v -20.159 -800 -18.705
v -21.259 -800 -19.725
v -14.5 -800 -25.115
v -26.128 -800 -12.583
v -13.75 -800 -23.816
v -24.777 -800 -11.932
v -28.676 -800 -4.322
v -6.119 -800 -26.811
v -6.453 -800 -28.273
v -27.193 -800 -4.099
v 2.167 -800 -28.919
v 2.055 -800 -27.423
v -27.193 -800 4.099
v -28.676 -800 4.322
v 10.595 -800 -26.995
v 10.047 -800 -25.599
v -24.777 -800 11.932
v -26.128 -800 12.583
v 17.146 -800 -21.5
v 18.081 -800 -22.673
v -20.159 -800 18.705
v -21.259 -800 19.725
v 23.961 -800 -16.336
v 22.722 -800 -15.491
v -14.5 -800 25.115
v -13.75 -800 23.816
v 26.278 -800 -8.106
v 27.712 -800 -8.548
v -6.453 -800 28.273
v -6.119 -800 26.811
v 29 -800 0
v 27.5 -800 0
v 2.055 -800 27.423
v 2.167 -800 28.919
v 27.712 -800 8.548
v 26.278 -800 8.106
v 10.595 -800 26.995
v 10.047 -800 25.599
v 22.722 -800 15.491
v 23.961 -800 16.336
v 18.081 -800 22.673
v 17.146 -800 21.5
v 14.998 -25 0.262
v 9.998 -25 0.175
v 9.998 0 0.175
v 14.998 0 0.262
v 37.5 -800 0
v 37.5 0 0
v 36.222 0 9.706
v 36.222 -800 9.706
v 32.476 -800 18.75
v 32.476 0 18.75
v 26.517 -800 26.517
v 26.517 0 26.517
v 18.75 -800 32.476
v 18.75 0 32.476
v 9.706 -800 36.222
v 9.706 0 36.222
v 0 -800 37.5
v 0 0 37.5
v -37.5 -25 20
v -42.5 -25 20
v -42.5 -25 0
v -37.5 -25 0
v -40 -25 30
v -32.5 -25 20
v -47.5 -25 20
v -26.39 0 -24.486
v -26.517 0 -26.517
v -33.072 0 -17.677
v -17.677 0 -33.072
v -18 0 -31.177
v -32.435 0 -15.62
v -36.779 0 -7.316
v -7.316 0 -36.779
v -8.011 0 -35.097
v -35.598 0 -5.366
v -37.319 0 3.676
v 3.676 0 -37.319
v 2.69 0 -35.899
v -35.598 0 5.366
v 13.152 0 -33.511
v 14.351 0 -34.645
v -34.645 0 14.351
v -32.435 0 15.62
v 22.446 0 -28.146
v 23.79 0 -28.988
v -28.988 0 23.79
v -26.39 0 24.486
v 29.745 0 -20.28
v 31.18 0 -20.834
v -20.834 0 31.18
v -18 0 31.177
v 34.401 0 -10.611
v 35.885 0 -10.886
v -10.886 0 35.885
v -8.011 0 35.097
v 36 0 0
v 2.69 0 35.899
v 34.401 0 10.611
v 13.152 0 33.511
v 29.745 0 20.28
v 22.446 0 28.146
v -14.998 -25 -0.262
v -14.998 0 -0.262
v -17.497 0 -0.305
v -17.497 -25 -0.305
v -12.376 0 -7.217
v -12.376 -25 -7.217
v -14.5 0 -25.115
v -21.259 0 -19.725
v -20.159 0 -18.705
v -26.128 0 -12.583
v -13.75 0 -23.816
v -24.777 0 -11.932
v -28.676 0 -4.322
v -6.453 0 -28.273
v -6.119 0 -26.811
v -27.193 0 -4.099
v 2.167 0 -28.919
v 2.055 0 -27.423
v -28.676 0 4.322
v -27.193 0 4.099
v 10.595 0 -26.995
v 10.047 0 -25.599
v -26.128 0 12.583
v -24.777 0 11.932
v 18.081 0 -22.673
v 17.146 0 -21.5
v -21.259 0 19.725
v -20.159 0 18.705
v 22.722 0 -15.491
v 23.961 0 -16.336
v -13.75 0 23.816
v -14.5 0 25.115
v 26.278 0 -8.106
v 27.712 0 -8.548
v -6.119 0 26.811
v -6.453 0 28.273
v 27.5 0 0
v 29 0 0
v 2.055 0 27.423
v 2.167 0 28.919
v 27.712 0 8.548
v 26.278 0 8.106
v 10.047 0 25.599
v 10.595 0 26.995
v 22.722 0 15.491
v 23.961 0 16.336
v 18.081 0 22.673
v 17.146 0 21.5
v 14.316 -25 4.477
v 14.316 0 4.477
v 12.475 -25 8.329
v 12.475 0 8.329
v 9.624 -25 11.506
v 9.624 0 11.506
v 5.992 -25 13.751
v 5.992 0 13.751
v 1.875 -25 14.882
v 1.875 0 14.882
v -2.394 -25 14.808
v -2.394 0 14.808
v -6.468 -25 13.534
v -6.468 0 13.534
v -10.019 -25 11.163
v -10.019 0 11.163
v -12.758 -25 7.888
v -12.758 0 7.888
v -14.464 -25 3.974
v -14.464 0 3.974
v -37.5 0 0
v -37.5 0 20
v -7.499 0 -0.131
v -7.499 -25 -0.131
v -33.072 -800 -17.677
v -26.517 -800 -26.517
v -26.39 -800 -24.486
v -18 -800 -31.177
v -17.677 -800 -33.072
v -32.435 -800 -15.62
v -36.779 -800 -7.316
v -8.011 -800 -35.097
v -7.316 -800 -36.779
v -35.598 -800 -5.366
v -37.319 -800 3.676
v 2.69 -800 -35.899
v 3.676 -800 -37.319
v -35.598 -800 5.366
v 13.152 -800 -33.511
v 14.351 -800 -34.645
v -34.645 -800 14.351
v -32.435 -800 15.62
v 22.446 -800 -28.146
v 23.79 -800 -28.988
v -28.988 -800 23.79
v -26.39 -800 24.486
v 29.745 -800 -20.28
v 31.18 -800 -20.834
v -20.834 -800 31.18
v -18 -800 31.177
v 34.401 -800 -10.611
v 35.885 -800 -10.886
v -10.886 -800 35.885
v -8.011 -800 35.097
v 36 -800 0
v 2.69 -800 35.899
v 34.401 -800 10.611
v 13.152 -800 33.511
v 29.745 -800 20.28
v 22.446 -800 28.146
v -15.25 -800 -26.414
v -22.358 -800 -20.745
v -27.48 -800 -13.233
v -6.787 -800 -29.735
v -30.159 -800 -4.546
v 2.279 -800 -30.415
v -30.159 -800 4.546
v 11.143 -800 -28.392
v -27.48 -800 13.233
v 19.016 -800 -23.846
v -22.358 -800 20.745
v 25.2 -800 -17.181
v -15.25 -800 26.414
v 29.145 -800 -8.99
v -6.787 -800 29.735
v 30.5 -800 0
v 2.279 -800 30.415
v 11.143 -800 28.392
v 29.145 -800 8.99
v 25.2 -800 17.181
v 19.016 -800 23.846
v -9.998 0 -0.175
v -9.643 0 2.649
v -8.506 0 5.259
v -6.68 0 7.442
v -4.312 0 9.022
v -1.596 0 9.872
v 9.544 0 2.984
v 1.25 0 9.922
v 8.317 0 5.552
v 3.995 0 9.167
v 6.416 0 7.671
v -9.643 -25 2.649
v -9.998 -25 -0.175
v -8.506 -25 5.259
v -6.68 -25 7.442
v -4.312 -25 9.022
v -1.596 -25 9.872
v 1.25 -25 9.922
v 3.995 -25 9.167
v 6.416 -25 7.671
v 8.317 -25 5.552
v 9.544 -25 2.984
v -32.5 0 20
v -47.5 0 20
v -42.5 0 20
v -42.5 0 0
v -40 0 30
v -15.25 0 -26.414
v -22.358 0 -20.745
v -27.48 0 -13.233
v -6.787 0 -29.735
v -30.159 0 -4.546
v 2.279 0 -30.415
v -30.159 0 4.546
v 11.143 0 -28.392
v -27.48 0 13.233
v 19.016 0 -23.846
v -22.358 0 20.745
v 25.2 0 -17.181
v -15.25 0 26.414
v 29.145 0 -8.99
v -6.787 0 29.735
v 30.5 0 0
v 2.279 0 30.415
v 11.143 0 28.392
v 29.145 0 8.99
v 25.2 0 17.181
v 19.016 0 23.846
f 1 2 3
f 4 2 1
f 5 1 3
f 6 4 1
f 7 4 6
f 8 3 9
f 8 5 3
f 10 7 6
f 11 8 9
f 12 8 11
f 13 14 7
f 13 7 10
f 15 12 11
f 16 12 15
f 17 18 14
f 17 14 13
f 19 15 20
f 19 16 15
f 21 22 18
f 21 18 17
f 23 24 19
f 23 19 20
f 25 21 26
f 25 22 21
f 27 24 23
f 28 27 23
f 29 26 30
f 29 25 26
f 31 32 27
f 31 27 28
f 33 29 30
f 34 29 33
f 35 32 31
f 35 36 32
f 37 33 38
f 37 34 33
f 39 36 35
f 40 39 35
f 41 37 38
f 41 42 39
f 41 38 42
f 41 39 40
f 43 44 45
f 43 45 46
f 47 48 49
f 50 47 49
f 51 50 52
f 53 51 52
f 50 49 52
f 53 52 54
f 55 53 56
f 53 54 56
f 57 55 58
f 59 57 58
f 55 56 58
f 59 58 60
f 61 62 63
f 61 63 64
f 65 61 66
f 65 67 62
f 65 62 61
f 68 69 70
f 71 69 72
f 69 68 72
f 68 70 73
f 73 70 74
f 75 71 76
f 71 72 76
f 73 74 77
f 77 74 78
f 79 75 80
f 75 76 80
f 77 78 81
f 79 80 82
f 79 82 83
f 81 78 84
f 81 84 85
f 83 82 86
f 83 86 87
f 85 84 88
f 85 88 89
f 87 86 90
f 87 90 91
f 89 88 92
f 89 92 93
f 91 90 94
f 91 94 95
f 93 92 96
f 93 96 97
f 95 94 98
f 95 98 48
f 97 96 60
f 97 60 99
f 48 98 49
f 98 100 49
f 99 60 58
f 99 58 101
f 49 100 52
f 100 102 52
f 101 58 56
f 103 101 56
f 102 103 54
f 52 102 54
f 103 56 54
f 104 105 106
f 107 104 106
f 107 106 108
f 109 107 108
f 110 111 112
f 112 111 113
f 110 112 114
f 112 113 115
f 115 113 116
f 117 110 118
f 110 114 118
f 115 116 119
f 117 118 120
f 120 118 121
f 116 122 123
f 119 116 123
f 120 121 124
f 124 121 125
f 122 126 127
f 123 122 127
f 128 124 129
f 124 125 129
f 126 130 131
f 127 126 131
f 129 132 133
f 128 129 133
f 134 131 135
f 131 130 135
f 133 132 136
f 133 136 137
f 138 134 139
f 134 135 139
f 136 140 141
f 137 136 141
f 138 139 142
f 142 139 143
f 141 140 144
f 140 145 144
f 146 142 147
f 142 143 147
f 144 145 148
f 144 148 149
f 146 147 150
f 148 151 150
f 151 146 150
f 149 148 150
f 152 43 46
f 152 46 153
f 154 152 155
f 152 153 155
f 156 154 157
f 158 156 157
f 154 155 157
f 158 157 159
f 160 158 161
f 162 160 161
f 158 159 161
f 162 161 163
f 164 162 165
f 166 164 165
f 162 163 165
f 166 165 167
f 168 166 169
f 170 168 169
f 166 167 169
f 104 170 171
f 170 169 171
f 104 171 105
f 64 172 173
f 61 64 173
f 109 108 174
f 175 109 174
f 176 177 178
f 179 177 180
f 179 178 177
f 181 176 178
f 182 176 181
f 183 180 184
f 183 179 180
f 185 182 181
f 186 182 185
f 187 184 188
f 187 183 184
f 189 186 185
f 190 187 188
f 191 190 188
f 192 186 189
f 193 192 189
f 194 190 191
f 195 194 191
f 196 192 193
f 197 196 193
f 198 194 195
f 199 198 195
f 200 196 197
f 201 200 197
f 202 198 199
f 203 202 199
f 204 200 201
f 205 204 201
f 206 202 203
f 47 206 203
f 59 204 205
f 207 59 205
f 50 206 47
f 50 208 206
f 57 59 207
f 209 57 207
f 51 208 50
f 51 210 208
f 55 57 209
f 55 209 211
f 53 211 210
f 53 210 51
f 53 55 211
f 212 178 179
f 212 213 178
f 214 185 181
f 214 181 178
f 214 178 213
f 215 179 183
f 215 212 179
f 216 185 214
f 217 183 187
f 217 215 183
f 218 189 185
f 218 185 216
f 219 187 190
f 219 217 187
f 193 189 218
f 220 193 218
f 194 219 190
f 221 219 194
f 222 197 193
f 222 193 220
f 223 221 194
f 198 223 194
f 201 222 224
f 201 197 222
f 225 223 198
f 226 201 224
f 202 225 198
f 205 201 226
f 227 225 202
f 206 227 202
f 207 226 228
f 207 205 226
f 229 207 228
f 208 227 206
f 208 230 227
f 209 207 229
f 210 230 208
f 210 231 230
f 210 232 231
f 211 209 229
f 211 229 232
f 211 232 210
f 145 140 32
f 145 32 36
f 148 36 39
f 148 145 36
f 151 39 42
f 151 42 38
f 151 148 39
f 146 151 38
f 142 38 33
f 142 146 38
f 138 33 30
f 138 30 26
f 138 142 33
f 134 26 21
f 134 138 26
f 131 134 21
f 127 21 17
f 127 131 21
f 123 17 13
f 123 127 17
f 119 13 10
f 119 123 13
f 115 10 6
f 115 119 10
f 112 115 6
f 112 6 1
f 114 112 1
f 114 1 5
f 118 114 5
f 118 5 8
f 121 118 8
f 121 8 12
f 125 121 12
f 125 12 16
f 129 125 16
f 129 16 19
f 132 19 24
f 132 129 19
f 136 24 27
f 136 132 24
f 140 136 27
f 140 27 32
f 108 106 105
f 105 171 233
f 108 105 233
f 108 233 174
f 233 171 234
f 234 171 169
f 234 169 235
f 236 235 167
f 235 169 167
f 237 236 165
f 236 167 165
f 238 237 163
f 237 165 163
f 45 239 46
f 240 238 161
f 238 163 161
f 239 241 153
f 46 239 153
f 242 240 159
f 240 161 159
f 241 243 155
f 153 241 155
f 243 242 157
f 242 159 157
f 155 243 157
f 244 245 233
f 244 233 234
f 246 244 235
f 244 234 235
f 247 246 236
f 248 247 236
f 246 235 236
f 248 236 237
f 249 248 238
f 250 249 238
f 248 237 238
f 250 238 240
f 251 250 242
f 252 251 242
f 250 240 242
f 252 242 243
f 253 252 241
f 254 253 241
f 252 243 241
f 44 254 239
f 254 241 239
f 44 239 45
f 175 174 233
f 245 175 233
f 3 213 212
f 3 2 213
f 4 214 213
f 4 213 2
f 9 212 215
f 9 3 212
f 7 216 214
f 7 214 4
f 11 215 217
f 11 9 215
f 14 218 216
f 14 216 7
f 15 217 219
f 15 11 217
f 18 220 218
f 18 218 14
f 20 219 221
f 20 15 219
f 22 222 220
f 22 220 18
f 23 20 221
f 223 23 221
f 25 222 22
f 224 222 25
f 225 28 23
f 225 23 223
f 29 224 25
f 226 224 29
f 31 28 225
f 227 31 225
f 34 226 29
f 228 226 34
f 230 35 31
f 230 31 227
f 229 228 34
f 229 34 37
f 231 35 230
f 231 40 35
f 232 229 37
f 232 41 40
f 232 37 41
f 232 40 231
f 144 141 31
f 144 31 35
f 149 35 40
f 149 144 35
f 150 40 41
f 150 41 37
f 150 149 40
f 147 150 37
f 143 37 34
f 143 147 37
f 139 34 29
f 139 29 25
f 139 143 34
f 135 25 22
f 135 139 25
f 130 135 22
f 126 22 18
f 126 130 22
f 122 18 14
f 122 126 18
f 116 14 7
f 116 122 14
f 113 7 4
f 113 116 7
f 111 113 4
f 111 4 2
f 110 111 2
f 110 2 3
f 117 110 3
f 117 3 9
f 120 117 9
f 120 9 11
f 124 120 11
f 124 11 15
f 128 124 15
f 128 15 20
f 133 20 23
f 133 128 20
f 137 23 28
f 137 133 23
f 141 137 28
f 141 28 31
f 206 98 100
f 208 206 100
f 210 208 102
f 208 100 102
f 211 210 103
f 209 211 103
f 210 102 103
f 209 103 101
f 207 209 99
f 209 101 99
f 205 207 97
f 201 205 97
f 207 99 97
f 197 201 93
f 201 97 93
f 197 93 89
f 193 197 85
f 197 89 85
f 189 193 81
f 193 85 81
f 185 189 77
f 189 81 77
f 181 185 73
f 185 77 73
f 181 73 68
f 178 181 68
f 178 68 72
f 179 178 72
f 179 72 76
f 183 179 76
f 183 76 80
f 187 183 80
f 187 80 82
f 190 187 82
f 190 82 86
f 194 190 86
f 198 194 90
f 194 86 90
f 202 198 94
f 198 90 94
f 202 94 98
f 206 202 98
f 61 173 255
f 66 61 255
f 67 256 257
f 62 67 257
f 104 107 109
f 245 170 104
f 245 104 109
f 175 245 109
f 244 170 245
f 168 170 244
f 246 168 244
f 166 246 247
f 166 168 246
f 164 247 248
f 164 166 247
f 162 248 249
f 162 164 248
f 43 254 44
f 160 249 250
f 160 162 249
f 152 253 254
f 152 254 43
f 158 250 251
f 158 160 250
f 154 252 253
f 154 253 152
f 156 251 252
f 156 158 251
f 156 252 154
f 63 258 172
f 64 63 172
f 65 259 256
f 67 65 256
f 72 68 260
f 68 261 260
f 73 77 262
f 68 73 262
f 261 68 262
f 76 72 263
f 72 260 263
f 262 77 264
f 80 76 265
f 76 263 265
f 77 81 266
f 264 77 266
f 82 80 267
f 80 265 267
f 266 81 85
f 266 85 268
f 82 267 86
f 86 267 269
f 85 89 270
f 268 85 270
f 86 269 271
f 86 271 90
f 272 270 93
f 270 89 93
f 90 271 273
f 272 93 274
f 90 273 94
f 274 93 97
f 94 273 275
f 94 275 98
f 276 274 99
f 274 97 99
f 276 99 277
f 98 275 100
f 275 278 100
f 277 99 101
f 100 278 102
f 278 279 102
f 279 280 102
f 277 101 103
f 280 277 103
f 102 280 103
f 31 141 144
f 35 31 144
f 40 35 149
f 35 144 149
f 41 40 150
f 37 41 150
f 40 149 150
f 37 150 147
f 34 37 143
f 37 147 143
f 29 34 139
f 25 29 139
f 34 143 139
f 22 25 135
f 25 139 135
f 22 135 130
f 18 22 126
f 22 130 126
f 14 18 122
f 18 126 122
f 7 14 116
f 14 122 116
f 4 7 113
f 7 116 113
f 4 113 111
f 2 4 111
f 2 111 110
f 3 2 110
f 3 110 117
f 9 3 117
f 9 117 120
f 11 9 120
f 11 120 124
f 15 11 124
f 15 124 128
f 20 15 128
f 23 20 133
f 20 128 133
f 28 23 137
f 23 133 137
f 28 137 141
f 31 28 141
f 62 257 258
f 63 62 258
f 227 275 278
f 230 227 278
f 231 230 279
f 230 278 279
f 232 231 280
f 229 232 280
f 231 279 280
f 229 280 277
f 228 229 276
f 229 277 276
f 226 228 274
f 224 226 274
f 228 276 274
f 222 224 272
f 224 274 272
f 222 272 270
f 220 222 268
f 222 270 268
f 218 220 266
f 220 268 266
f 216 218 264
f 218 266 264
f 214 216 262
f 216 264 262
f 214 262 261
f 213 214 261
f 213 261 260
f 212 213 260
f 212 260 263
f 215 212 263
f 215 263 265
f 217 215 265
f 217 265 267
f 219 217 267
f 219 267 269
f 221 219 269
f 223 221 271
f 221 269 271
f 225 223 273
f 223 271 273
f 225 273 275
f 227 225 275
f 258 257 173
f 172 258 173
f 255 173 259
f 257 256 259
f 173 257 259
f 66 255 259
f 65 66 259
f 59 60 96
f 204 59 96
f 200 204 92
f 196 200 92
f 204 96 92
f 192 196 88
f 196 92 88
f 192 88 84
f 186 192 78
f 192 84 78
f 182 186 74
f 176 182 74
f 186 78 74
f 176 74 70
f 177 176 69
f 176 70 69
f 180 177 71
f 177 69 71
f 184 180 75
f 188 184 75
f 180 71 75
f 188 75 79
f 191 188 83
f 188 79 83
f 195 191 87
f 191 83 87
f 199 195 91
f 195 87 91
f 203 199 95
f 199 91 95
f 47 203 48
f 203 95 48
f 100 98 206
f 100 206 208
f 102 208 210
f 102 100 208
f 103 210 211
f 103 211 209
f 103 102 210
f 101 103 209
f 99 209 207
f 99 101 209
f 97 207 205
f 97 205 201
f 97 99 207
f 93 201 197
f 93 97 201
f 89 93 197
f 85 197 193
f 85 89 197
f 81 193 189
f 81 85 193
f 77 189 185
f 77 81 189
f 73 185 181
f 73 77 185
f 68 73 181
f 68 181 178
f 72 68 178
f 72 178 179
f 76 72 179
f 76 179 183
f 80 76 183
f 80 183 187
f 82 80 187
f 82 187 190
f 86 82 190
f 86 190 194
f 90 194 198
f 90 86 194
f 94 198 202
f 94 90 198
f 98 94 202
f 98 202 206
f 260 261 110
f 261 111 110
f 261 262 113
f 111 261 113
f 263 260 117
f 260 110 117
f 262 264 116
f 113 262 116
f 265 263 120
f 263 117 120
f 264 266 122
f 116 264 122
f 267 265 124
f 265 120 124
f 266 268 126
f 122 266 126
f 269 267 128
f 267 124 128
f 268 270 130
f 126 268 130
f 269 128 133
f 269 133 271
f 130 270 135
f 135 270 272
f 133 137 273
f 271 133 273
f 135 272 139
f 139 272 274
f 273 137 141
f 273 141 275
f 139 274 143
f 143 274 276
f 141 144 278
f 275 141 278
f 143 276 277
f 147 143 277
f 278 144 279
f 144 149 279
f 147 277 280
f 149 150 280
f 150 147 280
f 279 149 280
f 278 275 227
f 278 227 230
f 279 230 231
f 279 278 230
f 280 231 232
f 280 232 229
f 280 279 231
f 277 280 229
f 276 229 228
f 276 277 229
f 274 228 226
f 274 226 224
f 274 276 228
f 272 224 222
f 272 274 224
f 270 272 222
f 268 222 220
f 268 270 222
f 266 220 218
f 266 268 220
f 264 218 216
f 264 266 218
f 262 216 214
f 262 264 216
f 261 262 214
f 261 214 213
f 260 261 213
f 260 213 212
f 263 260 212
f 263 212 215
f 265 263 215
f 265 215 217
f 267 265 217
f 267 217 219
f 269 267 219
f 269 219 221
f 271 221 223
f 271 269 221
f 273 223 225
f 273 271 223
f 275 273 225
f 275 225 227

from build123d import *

# Parameters (mm, degrees)
F0_R     = 29
F0_R_2   = 27.5
F1_DEPTH = 800
F0_R_3   = 30.5
F2_DEPTH = 800
F0_R_4   = 36
F3_DEPTH = 800
F4_DEPTH = 800
F6_DEPTH = 25
F8_DEPTH = 25


with BuildPart() as f1:
    # F0 (on Front) → F1 (new body)
    with BuildSketch(Plane.XZ):
        Circle(F0_R)
        Circle(F0_R_2, mode=Mode.SUBTRACT)
    extrude(amount=F1_DEPTH)


with BuildPart() as f2:
    # F0 (on Front) → F2 (new body, through all)
    with BuildSketch(Plane.XZ):
        Circle(F0_R_3)
        Circle(F0_R, mode=Mode.SUBTRACT)
    extrude(amount=F2_DEPTH)


with BuildPart() as f3:
    # F0 (on Front) → F3 (new body, through all)
    with BuildSketch(Plane.XZ):
        Circle(F0_R_4)
        Circle(F0_R_3, mode=Mode.SUBTRACT)
    extrude(amount=F3_DEPTH)


with BuildPart() as f4:
    # F0 (on Front) → F4 (new body, through all)
    with BuildSketch(Plane.XZ):
        with BuildLine():
            ThreePointArc((0, 37.5), (-26.516504, -26.516504), (37.5, 0))
            ThreePointArc((37.5, 0), (26.516504, 26.516504), (0, 37.5))
        make_face()
        Circle(F0_R_4, mode=Mode.SUBTRACT)
    extrude(amount=F4_DEPTH)


with BuildPart() as f6:
    # F5 (on Front) → F6 (new body)
    with BuildSketch(Plane.XZ):
        with BuildLine():
            Line((9.998477, 0.174524), (14.997715, 0.261786))
            ThreePointArc((14.997715, 0.261786), (-0.261786, 14.997715), (-14.997715, -0.261786))
            Line((-14.997715, -0.261786), (-17.497335, -0.305417))
            Line((-17.497335, -0.305417), (-12.375929, -7.217089))
            Line((-12.375929, -7.217089), (-7.498858, -0.130893))
            Line((-7.498858, -0.130893), (-9.998477, -0.174524))
            ThreePointArc((-9.998477, -0.174524), (-0.174524, 9.998477), (9.998477, 0.174524))
        make_face()
    extrude(amount=F6_DEPTH)


with BuildPart() as f8:
    # F7 (on Front) → F8 (new body)
    with BuildSketch(Plane.XZ):
        Polygon((-37.5, 0), (-37.5, 20), (-32.5, 20), (-40, 30), (-47.5, 20), (-42.5, 20), (-42.5, 0), align=None)
    extrude(amount=F8_DEPTH)


solid = Compound([f1.part, f2.part, f3.part, f4.part, f6.part, f8.part])
